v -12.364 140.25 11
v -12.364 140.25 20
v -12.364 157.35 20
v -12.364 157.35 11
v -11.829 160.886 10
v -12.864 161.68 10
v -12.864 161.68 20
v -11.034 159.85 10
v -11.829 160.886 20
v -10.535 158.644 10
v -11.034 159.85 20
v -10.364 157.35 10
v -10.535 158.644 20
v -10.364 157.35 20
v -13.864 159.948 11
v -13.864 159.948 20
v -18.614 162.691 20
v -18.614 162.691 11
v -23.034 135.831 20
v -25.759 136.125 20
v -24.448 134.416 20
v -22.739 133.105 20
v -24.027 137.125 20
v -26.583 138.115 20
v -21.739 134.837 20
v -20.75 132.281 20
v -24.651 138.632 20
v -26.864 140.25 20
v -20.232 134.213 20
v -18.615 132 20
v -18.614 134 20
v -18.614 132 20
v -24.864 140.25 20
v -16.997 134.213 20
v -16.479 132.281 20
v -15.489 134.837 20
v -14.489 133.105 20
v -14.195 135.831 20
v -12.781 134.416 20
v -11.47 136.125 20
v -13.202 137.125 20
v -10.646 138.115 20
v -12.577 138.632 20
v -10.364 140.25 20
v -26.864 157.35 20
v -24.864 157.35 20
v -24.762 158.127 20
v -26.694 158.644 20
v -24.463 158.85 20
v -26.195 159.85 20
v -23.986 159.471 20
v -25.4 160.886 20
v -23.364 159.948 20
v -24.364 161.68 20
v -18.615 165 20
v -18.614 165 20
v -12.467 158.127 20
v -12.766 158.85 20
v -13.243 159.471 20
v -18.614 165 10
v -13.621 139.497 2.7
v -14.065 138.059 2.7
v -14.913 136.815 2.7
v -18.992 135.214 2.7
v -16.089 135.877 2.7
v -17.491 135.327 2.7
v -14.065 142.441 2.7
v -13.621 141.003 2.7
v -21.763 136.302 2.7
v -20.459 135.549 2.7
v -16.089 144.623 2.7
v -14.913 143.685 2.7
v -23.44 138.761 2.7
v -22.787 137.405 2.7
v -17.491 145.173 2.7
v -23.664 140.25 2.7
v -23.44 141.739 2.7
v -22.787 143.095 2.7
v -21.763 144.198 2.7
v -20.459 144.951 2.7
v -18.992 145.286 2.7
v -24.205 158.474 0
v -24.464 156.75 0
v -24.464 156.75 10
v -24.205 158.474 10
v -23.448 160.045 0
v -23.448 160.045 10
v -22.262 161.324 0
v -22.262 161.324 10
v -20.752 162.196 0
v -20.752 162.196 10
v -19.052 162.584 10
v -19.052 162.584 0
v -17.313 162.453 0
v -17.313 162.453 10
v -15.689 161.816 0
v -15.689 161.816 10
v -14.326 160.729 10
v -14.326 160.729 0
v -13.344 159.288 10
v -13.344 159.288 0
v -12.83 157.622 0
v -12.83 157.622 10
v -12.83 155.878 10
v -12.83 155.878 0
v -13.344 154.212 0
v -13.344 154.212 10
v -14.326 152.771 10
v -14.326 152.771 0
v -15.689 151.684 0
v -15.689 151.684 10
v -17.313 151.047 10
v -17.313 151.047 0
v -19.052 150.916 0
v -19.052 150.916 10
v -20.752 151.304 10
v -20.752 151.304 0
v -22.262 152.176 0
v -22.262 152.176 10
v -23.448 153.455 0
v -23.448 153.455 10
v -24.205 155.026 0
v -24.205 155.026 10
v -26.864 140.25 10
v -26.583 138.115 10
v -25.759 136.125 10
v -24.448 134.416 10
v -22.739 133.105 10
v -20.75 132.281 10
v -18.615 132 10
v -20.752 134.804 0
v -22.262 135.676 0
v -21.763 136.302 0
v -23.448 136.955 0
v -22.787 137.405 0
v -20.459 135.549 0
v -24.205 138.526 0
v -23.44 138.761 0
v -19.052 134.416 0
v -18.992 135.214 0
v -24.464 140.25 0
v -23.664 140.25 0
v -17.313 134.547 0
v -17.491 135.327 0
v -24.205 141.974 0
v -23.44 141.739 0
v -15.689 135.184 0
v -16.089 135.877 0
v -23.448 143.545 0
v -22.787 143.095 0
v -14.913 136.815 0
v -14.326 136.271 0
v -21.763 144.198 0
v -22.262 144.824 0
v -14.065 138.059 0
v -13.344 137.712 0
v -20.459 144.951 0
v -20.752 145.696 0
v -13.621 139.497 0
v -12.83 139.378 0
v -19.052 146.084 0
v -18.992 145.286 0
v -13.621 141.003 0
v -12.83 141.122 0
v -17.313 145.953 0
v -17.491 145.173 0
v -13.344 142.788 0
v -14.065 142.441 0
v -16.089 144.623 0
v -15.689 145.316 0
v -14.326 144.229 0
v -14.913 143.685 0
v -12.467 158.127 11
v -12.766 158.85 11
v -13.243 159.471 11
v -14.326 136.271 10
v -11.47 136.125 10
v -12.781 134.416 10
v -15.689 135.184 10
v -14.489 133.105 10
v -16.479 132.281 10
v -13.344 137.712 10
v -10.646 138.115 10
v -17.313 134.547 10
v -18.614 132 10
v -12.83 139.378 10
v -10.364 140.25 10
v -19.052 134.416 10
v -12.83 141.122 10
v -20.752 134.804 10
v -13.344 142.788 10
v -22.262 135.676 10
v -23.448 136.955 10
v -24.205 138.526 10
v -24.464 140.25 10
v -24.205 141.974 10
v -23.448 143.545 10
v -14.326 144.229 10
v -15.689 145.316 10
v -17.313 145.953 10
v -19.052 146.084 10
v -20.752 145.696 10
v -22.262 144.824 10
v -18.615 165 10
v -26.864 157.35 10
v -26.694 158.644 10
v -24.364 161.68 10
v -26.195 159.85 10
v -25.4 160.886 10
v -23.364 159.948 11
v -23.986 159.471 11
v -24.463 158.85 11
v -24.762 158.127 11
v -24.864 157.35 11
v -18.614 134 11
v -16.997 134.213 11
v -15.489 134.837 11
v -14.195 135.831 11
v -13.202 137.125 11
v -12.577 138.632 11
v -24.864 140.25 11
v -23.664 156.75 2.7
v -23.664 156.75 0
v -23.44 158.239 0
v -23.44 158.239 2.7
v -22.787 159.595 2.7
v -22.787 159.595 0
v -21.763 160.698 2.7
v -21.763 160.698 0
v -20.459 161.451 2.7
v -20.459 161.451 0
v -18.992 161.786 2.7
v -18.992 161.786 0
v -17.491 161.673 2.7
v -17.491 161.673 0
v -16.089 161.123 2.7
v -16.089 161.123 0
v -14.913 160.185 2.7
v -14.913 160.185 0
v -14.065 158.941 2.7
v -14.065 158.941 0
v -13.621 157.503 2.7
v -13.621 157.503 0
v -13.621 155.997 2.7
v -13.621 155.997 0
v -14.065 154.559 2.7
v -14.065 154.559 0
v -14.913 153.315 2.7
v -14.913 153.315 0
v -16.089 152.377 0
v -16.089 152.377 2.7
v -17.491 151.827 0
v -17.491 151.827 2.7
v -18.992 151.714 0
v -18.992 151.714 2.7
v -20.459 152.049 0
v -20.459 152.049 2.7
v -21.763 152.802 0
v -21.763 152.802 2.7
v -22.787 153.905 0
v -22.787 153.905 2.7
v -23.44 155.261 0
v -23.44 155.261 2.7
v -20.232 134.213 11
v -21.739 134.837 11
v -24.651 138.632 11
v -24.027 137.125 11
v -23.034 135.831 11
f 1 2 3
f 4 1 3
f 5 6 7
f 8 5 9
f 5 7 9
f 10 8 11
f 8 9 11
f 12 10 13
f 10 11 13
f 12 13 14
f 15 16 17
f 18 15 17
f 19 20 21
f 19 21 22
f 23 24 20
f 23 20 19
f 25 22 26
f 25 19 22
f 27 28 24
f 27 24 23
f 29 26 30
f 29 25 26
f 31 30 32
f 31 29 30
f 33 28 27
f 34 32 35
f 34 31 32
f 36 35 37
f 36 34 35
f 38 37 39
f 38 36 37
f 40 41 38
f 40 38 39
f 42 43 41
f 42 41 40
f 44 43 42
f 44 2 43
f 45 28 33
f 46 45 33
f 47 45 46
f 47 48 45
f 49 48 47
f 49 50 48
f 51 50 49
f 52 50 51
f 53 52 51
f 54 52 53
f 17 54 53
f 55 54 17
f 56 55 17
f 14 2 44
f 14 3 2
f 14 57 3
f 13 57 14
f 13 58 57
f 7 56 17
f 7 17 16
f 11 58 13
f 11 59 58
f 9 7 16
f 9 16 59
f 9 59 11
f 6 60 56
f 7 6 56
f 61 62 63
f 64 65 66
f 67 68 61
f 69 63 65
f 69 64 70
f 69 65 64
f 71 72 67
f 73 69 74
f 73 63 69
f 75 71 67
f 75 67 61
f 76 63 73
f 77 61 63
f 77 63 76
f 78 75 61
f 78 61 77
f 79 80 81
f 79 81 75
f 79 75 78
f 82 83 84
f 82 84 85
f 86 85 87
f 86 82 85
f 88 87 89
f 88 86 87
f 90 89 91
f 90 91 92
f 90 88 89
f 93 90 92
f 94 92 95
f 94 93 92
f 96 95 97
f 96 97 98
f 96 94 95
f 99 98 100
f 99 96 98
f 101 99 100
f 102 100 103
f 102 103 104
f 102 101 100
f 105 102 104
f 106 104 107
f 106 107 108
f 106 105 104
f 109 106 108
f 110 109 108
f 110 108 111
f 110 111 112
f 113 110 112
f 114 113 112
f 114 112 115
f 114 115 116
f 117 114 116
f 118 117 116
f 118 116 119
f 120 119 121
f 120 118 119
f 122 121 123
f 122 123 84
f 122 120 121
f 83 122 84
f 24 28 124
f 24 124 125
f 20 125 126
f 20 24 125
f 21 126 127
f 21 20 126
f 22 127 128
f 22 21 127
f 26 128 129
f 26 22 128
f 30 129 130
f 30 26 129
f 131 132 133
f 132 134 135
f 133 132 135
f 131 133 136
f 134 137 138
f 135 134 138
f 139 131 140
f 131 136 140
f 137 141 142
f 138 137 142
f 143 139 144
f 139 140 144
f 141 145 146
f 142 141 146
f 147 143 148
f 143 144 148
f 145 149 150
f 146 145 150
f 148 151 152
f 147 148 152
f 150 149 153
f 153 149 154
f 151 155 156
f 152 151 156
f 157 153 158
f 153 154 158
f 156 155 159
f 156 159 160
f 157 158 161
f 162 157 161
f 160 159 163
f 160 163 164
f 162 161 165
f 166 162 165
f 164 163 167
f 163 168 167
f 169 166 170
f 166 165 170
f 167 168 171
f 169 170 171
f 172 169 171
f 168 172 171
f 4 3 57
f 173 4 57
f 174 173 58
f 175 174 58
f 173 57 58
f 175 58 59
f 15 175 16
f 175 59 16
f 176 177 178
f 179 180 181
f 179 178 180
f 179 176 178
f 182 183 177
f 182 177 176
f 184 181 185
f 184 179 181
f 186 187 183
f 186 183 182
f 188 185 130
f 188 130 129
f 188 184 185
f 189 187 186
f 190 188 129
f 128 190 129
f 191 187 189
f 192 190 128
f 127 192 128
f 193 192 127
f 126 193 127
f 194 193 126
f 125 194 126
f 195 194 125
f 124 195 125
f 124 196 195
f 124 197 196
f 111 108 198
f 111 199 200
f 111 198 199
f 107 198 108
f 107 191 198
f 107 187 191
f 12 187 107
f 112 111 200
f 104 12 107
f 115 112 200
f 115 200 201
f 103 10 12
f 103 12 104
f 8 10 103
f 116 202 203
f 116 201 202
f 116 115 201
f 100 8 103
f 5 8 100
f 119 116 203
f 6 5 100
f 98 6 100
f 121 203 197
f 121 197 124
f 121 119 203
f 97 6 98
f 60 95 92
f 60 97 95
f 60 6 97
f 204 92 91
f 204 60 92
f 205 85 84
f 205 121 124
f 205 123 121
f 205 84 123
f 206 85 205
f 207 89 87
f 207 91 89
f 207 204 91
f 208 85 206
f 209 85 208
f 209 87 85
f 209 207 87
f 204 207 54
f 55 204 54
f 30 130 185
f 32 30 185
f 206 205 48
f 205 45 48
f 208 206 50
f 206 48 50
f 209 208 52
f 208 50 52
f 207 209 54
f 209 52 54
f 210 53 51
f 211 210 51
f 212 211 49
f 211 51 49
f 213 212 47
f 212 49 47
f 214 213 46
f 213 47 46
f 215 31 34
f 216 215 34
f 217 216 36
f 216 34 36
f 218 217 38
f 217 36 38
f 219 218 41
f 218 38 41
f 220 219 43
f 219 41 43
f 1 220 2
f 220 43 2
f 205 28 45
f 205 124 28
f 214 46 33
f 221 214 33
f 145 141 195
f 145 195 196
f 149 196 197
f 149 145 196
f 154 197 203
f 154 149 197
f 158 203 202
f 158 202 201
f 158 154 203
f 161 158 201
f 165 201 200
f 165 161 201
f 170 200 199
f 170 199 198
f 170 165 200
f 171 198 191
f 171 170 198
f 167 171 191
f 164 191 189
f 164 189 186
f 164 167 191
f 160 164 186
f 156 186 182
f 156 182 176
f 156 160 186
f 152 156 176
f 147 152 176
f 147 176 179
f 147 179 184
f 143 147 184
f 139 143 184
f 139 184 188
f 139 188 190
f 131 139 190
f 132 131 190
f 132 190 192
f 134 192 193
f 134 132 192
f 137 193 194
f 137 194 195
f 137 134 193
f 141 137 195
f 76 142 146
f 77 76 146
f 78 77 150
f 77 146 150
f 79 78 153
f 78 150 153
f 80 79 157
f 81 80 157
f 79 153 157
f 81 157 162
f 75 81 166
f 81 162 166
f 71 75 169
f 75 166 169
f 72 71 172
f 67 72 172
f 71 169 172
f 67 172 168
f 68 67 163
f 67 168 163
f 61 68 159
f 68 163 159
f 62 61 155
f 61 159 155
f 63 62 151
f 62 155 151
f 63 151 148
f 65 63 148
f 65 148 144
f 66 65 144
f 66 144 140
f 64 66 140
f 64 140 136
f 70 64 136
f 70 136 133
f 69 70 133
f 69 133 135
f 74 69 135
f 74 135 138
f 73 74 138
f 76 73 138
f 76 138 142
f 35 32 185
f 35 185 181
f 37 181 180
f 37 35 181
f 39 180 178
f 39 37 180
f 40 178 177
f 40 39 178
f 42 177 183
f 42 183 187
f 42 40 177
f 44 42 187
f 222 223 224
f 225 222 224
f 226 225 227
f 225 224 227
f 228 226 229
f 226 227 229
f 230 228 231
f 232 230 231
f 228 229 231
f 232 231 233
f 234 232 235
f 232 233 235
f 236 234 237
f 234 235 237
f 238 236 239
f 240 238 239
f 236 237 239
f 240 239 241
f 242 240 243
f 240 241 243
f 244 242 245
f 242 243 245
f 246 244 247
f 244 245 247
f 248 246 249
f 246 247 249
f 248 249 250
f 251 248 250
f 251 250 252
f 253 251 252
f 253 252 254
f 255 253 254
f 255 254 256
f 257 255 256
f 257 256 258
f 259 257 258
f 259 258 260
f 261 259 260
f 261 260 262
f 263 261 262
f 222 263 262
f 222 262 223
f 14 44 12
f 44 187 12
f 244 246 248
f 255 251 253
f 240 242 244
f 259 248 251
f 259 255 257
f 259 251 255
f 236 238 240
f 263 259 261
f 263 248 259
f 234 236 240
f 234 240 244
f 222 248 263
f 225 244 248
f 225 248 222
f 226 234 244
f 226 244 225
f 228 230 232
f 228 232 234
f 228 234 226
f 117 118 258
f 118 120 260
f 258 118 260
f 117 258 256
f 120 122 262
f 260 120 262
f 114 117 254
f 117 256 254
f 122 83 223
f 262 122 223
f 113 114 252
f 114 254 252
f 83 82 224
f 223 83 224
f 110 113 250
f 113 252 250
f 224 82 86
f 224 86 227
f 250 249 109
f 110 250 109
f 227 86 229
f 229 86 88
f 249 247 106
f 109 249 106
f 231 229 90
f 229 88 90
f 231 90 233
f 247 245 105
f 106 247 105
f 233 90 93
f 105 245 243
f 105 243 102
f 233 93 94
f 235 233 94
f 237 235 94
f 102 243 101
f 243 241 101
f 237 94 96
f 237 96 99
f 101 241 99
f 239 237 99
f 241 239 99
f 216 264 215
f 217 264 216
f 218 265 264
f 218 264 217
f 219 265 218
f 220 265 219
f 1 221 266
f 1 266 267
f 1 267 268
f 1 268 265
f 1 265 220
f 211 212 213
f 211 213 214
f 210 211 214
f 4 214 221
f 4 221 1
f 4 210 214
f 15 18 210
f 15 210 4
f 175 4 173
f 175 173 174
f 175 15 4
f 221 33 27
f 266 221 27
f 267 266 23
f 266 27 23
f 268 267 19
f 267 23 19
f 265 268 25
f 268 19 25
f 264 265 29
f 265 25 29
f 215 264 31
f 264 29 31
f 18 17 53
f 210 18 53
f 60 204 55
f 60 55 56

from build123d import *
from OCP.BRepFilletAPI import BRepFilletAPI_MakeChamfer

# Parameters (mm, degrees)
SKETCH1_W                       = 16.5
SKETCH1_H                       = 33
BOSS_EXTRUDE1_DEPTH             = 20
FILLET1_R                       = 8.25
CHAMFER1_SIZE                   = 8.25
CHAMFER1_SIZE_2                 = 4.763139721
SKETCH2_W                       = 16.5
SKETCH2_H                       = 33
SKETCH2_R                       = 5.85
SKETCH2_R_2                     = 5.05
CUT_EXTRUDE1_DEPTH              = 10
FILLET2_R                       = 5
SKETCH4_R                       = 5.1
BOSS_EXTRUDE2_DEPTH             = 7.3
SCHNITT_LINEAR_AUSTRAGEN1_DEPTH = 9


with BuildPart() as part:
    # Sketch1 → Boss-Extrude1 (new body)
    with BuildSketch(Plane.XY):
        with Locations((-18.614437814, 148.5)):
            Rectangle(SKETCH1_W, SKETCH1_H)
    extrude(amount=BOSS_EXTRUDE1_DEPTH)

    # Fillet1
    fillet1_edges = [part.edges().sort_by_distance(p)[0] for p in [
        (-26.864437814, 132, 10),
        (-10.364437814, 132, 10),
    ]]
    fillet(fillet1_edges, radius=FILLET1_R - 0.0001)  # a hair under: the kernel refuses the full size

    # Chamfer1
    chamfer1_edges_1 = [part.edges().sort_by_distance(p)[0] for p in [
        (-26.864437814, 165, 10),
    ]]
    chamfer1_side_1 = [part.faces().sort_by_distance(p)[0] for p in [
        (-26.769175019, 165, 10),
    ]]
    chamfer1_edges_2 = [part.edges().sort_by_distance(p)[0] for p in [
        (-10.364437814, 165, 10),
    ]]
    chamfer1_side_2 = [part.faces().sort_by_distance(p)[0] for p in [
        (-10.364437814, 164.904737206, 10),
    ]]
    chamfer1 = BRepFilletAPI_MakeChamfer(part.part.solid().wrapped)
    for e in chamfer1_edges_1:
        chamfer1.Add(CHAMFER1_SIZE - 0.0001, CHAMFER1_SIZE_2 - 0.0001, e.wrapped, chamfer1_side_1[0].wrapped)
    for e in chamfer1_edges_2:
        chamfer1.Add(CHAMFER1_SIZE_2 - 0.0001, CHAMFER1_SIZE - 0.0001, e.wrapped, chamfer1_side_2[0].wrapped)
    add(Compound.cast(chamfer1.Shape()), mode=Mode.REPLACE)  # a hair under: the kernel refuses the full size

    # Sketch2 → Cut-Extrude1 (cut)
    # profile 1 of 3: a face of its own
    with BuildSketch(Plane(origin=(0, 0, 0), x_dir=(-1, 0, 0), z_dir=(0, 0, -1))):
        with Locations((18.614437814, 148.5)):
            Rectangle(SKETCH2_W, SKETCH2_H)
        with Locations((18.614437814, 156.75)):
            Circle(SKETCH2_R, mode=Mode.SUBTRACT)
        with Locations((18.614437814, 140.25)):
            Circle(SKETCH2_R, mode=Mode.SUBTRACT)
    # profile 2 of 3: a face of its own
    with BuildSketch(Plane(origin=(0, 0, 0), x_dir=(-1, 0, 0), z_dir=(0, 0, -1))):
        with Locations((18.614437814, 140.25)):
            Circle(SKETCH2_R_2)
    # profile 3 of 3: a face of its own
    with BuildSketch(Plane(origin=(0, 0, 0), x_dir=(-1, 0, 0), z_dir=(0, 0, -1))):
        with Locations((18.614437814, 156.75)):
            Circle(SKETCH2_R_2)
    extrude(amount=-CUT_EXTRUDE1_DEPTH, mode=Mode.SUBTRACT)

    # Fillet2
    fillet2_edges = [part.edges().sort_by_distance(p)[0] for p in [
        (-26.864437814, 160.236960279, 15),
        (-10.364437814, 160.236960279, 15),
    ]]
    fillet(fillet2_edges, radius=FILLET2_R)

    # Sketch4 → Boss-Extrude2 (add)
    with BuildSketch(Plane(origin=(0, 0, 10), x_dir=(-1, 0, 0), z_dir=(0, 0, -1))):
        with Locations((18.614437814, 156.75)):
            Circle(SKETCH4_R)
        with Locations((18.614437814, 140.25)):
            Circle(SKETCH4_R)
    extrude(amount=BOSS_EXTRUDE2_DEPTH)

    # Skizze1 → Schnitt-Linear austragen1 (cut)
    with BuildSketch(Plane.XY.offset(20)):
        with BuildLine():
            Line((-12.364437814, 140.25), (-12.364437814, 157.350108933))
            ThreePointArc((-12.364437814, 157.350108933), (-12.766361602, 158.850108933), (-13.864437814, 159.948185145))
            Line((-13.864437814, 159.948185145), (-18.614437814, 162.690598923))
            Line((-18.614437814, 162.690598923), (-23.364437814, 159.948185145))
            ThreePointArc((-23.364437814, 159.948185145), (-24.462514025, 158.850108933), (-24.864437814, 157.350108933))
            Line((-24.864437814, 157.350108933), (-24.864437814, 140.25))
            ThreePointArc((-24.864437814, 140.25), (-23.033855196, 135.830582618), (-18.614437814, 134))
            ThreePointArc((-18.614437814, 134), (-14.195020431, 135.830582618), (-12.364437814, 140.25))
        make_face()
    extrude(amount=-SCHNITT_LINEAR_AUSTRAGEN1_DEPTH, mode=Mode.SUBTRACT)


solid = part.part
